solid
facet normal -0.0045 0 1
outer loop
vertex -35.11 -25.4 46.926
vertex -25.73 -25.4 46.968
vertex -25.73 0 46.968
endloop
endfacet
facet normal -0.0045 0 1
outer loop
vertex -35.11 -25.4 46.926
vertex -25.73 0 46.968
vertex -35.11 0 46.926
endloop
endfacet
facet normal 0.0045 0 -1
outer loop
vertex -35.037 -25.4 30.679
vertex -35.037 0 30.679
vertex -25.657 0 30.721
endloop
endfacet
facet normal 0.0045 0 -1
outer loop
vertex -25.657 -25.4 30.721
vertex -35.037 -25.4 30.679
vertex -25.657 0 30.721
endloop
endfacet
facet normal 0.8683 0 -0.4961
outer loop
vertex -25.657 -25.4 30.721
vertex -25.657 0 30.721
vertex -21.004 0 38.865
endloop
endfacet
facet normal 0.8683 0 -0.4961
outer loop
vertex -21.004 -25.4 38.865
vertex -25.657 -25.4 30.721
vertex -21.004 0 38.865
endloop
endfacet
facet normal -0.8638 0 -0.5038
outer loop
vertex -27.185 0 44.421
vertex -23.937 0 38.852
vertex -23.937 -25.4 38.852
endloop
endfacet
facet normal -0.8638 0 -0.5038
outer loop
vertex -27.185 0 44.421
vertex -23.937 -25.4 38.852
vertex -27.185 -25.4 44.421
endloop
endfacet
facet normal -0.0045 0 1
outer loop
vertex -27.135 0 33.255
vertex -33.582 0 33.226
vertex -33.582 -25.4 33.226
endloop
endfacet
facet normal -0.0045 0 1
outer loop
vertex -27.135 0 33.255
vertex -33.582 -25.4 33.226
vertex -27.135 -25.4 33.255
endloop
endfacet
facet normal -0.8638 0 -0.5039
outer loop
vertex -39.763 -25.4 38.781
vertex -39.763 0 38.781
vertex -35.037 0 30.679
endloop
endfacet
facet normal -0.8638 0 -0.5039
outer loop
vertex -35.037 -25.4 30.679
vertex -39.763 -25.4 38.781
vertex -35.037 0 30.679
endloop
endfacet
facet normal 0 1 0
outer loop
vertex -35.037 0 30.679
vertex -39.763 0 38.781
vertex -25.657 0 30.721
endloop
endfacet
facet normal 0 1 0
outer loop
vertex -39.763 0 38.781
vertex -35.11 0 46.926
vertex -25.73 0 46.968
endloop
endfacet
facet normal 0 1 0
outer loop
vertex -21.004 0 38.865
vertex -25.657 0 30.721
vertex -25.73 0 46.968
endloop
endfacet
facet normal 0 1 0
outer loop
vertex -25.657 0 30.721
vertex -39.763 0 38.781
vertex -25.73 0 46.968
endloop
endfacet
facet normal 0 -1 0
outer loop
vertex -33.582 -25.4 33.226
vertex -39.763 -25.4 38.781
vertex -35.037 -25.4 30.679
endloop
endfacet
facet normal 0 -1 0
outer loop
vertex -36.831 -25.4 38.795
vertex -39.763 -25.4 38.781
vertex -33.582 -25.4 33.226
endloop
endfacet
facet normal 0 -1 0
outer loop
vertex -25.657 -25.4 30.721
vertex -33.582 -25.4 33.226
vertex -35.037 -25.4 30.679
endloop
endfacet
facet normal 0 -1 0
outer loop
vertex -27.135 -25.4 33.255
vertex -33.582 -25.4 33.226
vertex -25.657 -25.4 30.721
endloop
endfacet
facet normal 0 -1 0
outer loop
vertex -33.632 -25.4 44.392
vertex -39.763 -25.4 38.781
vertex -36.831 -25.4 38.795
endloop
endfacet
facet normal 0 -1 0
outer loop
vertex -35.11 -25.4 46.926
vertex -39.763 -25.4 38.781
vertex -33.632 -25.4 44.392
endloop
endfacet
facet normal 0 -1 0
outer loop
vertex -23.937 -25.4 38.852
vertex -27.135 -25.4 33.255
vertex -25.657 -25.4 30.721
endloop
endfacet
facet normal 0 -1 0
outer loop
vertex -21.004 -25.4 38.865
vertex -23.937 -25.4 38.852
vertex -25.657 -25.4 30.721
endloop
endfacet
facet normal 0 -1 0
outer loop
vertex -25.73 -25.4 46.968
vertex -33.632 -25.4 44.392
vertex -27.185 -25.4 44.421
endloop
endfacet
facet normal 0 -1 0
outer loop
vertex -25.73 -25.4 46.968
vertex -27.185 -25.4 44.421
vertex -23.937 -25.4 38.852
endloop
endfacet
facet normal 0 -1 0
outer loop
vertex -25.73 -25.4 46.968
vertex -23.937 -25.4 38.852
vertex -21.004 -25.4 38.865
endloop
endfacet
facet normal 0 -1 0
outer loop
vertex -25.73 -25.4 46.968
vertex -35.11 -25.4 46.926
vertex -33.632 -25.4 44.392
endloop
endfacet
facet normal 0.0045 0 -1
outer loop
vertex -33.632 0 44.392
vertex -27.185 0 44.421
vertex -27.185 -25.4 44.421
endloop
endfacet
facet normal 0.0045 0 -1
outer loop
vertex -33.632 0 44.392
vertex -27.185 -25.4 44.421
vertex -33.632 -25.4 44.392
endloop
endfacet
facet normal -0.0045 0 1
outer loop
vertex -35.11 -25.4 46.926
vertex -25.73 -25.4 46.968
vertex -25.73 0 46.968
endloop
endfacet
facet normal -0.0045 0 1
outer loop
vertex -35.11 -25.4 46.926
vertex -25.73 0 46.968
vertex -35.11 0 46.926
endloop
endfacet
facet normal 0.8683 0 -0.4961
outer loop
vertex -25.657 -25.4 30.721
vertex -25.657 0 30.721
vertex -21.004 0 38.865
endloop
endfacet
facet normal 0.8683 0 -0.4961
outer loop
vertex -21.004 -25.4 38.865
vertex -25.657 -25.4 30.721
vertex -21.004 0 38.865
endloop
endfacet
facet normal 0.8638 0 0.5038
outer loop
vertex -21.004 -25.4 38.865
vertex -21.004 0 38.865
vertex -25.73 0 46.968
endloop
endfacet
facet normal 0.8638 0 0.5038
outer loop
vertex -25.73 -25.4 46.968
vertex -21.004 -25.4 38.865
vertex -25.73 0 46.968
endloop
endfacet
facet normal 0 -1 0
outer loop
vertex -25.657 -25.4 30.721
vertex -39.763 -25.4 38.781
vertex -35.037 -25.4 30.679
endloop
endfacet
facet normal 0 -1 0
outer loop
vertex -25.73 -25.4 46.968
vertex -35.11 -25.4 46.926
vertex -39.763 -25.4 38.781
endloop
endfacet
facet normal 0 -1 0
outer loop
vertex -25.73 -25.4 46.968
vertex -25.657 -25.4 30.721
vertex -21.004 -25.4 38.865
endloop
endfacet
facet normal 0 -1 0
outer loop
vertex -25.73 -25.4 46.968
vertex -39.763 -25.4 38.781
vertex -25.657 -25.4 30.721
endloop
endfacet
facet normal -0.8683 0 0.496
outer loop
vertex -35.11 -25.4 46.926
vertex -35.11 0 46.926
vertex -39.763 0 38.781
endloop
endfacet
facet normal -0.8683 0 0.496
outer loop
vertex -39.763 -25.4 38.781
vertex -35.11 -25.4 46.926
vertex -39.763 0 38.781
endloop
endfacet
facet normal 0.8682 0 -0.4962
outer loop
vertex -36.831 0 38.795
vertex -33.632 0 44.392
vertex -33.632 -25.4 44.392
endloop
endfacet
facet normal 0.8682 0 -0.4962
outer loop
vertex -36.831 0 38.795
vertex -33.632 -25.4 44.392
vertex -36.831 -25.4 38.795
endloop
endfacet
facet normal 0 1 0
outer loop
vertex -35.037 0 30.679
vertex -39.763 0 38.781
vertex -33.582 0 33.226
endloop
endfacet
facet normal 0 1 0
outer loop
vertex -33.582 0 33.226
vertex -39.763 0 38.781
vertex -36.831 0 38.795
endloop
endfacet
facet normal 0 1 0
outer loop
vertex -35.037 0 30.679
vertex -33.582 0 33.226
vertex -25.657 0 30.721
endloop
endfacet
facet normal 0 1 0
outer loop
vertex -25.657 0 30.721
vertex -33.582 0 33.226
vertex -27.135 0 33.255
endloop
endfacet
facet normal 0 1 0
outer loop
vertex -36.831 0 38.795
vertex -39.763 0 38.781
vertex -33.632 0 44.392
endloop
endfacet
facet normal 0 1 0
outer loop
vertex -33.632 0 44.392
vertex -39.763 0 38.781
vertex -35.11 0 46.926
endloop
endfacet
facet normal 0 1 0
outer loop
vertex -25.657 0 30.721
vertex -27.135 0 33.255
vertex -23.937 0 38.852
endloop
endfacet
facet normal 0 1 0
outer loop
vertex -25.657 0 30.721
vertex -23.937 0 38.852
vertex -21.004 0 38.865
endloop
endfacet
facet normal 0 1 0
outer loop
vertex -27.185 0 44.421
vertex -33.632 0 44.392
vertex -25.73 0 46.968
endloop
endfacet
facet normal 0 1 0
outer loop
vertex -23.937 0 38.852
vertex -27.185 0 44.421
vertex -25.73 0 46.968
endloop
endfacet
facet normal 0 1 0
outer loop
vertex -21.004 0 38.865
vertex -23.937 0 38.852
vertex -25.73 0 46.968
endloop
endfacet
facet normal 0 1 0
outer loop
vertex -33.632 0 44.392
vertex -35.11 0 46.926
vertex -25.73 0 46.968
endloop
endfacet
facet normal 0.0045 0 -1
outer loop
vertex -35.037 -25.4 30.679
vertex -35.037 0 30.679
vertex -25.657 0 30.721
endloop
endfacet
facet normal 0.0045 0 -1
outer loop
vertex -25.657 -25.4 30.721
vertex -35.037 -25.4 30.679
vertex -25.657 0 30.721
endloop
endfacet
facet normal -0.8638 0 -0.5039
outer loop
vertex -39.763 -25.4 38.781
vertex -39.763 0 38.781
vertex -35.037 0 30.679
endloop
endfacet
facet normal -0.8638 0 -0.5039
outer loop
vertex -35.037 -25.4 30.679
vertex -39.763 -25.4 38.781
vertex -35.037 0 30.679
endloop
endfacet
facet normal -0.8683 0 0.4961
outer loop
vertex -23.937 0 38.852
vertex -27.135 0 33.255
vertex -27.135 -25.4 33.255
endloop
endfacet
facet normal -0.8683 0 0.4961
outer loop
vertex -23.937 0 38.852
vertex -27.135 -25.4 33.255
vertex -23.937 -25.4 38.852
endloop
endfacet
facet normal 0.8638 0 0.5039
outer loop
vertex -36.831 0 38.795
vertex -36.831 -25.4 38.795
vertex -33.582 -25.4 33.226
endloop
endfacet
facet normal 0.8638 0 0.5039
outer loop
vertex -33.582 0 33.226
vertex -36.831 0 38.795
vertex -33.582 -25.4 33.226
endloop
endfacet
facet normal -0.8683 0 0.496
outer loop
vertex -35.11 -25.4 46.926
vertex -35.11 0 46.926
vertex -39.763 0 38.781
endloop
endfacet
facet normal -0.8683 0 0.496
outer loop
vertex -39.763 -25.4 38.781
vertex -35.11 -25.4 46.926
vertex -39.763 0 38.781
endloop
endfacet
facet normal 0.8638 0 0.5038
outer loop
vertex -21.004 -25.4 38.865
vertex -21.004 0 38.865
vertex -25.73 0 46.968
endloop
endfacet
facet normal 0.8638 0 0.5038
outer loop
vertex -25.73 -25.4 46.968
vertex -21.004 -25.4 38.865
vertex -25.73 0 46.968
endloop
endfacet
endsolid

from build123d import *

# Parameters (mm, degrees)
F2_DEPTH = 25.4
F1_R     = 15.1955207551
F3_DEPTH = 25.4
F5_T     = -2.54


with BuildPart() as f2:
    # F0 (on Front) → F2 (new body)
    with BuildSketch(Plane.XZ):
        Polygon((-25.7299293739, 46.9676795868), (-35.1098738611, 46.9256974757), (-39.7634885299, 38.7814362081), (-35.0371587116, 30.6791570516), (-25.6572142243, 30.7211391628), (-21.0035995555, 38.8654004304), align=None)
    extrude(amount=F2_DEPTH)


with BuildPart() as f2b:
    # F1 (on Front) → F2, piece 2 (new body)
    with BuildSketch(Plane.XZ):
        with Locations((-30.7211373199, 39.1610125489)):
            Circle(F1_R)
    extrude(amount=F2_DEPTH)

    # F4: intersect F2
    add(f2.part, mode=Mode.INTERSECT)

    # F5
    f5_openings = [f2b.faces().sort_by_distance(p)[0] for p in [
        (-30.383544, 0, 38.823418),
        (-30.383544, -25.4, 38.823418),
    ]]
    offset(amount=F5_T, openings=f5_openings)


with BuildPart() as f3:
    # F0 (on Front) → F3 (new body)
    with BuildSketch(Plane.XZ):
        Polygon((-25.7299293739, 46.9676795868), (-35.1098738611, 46.9256974757), (-39.7634885299, 38.7814362081), (-35.0371587116, 30.6791570516), (-25.6572142243, 30.7211391628), (-21.0035995555, 38.8654004304), align=None)
    extrude(amount=F3_DEPTH)


solid = Compound([f2b.part, f3.part])
